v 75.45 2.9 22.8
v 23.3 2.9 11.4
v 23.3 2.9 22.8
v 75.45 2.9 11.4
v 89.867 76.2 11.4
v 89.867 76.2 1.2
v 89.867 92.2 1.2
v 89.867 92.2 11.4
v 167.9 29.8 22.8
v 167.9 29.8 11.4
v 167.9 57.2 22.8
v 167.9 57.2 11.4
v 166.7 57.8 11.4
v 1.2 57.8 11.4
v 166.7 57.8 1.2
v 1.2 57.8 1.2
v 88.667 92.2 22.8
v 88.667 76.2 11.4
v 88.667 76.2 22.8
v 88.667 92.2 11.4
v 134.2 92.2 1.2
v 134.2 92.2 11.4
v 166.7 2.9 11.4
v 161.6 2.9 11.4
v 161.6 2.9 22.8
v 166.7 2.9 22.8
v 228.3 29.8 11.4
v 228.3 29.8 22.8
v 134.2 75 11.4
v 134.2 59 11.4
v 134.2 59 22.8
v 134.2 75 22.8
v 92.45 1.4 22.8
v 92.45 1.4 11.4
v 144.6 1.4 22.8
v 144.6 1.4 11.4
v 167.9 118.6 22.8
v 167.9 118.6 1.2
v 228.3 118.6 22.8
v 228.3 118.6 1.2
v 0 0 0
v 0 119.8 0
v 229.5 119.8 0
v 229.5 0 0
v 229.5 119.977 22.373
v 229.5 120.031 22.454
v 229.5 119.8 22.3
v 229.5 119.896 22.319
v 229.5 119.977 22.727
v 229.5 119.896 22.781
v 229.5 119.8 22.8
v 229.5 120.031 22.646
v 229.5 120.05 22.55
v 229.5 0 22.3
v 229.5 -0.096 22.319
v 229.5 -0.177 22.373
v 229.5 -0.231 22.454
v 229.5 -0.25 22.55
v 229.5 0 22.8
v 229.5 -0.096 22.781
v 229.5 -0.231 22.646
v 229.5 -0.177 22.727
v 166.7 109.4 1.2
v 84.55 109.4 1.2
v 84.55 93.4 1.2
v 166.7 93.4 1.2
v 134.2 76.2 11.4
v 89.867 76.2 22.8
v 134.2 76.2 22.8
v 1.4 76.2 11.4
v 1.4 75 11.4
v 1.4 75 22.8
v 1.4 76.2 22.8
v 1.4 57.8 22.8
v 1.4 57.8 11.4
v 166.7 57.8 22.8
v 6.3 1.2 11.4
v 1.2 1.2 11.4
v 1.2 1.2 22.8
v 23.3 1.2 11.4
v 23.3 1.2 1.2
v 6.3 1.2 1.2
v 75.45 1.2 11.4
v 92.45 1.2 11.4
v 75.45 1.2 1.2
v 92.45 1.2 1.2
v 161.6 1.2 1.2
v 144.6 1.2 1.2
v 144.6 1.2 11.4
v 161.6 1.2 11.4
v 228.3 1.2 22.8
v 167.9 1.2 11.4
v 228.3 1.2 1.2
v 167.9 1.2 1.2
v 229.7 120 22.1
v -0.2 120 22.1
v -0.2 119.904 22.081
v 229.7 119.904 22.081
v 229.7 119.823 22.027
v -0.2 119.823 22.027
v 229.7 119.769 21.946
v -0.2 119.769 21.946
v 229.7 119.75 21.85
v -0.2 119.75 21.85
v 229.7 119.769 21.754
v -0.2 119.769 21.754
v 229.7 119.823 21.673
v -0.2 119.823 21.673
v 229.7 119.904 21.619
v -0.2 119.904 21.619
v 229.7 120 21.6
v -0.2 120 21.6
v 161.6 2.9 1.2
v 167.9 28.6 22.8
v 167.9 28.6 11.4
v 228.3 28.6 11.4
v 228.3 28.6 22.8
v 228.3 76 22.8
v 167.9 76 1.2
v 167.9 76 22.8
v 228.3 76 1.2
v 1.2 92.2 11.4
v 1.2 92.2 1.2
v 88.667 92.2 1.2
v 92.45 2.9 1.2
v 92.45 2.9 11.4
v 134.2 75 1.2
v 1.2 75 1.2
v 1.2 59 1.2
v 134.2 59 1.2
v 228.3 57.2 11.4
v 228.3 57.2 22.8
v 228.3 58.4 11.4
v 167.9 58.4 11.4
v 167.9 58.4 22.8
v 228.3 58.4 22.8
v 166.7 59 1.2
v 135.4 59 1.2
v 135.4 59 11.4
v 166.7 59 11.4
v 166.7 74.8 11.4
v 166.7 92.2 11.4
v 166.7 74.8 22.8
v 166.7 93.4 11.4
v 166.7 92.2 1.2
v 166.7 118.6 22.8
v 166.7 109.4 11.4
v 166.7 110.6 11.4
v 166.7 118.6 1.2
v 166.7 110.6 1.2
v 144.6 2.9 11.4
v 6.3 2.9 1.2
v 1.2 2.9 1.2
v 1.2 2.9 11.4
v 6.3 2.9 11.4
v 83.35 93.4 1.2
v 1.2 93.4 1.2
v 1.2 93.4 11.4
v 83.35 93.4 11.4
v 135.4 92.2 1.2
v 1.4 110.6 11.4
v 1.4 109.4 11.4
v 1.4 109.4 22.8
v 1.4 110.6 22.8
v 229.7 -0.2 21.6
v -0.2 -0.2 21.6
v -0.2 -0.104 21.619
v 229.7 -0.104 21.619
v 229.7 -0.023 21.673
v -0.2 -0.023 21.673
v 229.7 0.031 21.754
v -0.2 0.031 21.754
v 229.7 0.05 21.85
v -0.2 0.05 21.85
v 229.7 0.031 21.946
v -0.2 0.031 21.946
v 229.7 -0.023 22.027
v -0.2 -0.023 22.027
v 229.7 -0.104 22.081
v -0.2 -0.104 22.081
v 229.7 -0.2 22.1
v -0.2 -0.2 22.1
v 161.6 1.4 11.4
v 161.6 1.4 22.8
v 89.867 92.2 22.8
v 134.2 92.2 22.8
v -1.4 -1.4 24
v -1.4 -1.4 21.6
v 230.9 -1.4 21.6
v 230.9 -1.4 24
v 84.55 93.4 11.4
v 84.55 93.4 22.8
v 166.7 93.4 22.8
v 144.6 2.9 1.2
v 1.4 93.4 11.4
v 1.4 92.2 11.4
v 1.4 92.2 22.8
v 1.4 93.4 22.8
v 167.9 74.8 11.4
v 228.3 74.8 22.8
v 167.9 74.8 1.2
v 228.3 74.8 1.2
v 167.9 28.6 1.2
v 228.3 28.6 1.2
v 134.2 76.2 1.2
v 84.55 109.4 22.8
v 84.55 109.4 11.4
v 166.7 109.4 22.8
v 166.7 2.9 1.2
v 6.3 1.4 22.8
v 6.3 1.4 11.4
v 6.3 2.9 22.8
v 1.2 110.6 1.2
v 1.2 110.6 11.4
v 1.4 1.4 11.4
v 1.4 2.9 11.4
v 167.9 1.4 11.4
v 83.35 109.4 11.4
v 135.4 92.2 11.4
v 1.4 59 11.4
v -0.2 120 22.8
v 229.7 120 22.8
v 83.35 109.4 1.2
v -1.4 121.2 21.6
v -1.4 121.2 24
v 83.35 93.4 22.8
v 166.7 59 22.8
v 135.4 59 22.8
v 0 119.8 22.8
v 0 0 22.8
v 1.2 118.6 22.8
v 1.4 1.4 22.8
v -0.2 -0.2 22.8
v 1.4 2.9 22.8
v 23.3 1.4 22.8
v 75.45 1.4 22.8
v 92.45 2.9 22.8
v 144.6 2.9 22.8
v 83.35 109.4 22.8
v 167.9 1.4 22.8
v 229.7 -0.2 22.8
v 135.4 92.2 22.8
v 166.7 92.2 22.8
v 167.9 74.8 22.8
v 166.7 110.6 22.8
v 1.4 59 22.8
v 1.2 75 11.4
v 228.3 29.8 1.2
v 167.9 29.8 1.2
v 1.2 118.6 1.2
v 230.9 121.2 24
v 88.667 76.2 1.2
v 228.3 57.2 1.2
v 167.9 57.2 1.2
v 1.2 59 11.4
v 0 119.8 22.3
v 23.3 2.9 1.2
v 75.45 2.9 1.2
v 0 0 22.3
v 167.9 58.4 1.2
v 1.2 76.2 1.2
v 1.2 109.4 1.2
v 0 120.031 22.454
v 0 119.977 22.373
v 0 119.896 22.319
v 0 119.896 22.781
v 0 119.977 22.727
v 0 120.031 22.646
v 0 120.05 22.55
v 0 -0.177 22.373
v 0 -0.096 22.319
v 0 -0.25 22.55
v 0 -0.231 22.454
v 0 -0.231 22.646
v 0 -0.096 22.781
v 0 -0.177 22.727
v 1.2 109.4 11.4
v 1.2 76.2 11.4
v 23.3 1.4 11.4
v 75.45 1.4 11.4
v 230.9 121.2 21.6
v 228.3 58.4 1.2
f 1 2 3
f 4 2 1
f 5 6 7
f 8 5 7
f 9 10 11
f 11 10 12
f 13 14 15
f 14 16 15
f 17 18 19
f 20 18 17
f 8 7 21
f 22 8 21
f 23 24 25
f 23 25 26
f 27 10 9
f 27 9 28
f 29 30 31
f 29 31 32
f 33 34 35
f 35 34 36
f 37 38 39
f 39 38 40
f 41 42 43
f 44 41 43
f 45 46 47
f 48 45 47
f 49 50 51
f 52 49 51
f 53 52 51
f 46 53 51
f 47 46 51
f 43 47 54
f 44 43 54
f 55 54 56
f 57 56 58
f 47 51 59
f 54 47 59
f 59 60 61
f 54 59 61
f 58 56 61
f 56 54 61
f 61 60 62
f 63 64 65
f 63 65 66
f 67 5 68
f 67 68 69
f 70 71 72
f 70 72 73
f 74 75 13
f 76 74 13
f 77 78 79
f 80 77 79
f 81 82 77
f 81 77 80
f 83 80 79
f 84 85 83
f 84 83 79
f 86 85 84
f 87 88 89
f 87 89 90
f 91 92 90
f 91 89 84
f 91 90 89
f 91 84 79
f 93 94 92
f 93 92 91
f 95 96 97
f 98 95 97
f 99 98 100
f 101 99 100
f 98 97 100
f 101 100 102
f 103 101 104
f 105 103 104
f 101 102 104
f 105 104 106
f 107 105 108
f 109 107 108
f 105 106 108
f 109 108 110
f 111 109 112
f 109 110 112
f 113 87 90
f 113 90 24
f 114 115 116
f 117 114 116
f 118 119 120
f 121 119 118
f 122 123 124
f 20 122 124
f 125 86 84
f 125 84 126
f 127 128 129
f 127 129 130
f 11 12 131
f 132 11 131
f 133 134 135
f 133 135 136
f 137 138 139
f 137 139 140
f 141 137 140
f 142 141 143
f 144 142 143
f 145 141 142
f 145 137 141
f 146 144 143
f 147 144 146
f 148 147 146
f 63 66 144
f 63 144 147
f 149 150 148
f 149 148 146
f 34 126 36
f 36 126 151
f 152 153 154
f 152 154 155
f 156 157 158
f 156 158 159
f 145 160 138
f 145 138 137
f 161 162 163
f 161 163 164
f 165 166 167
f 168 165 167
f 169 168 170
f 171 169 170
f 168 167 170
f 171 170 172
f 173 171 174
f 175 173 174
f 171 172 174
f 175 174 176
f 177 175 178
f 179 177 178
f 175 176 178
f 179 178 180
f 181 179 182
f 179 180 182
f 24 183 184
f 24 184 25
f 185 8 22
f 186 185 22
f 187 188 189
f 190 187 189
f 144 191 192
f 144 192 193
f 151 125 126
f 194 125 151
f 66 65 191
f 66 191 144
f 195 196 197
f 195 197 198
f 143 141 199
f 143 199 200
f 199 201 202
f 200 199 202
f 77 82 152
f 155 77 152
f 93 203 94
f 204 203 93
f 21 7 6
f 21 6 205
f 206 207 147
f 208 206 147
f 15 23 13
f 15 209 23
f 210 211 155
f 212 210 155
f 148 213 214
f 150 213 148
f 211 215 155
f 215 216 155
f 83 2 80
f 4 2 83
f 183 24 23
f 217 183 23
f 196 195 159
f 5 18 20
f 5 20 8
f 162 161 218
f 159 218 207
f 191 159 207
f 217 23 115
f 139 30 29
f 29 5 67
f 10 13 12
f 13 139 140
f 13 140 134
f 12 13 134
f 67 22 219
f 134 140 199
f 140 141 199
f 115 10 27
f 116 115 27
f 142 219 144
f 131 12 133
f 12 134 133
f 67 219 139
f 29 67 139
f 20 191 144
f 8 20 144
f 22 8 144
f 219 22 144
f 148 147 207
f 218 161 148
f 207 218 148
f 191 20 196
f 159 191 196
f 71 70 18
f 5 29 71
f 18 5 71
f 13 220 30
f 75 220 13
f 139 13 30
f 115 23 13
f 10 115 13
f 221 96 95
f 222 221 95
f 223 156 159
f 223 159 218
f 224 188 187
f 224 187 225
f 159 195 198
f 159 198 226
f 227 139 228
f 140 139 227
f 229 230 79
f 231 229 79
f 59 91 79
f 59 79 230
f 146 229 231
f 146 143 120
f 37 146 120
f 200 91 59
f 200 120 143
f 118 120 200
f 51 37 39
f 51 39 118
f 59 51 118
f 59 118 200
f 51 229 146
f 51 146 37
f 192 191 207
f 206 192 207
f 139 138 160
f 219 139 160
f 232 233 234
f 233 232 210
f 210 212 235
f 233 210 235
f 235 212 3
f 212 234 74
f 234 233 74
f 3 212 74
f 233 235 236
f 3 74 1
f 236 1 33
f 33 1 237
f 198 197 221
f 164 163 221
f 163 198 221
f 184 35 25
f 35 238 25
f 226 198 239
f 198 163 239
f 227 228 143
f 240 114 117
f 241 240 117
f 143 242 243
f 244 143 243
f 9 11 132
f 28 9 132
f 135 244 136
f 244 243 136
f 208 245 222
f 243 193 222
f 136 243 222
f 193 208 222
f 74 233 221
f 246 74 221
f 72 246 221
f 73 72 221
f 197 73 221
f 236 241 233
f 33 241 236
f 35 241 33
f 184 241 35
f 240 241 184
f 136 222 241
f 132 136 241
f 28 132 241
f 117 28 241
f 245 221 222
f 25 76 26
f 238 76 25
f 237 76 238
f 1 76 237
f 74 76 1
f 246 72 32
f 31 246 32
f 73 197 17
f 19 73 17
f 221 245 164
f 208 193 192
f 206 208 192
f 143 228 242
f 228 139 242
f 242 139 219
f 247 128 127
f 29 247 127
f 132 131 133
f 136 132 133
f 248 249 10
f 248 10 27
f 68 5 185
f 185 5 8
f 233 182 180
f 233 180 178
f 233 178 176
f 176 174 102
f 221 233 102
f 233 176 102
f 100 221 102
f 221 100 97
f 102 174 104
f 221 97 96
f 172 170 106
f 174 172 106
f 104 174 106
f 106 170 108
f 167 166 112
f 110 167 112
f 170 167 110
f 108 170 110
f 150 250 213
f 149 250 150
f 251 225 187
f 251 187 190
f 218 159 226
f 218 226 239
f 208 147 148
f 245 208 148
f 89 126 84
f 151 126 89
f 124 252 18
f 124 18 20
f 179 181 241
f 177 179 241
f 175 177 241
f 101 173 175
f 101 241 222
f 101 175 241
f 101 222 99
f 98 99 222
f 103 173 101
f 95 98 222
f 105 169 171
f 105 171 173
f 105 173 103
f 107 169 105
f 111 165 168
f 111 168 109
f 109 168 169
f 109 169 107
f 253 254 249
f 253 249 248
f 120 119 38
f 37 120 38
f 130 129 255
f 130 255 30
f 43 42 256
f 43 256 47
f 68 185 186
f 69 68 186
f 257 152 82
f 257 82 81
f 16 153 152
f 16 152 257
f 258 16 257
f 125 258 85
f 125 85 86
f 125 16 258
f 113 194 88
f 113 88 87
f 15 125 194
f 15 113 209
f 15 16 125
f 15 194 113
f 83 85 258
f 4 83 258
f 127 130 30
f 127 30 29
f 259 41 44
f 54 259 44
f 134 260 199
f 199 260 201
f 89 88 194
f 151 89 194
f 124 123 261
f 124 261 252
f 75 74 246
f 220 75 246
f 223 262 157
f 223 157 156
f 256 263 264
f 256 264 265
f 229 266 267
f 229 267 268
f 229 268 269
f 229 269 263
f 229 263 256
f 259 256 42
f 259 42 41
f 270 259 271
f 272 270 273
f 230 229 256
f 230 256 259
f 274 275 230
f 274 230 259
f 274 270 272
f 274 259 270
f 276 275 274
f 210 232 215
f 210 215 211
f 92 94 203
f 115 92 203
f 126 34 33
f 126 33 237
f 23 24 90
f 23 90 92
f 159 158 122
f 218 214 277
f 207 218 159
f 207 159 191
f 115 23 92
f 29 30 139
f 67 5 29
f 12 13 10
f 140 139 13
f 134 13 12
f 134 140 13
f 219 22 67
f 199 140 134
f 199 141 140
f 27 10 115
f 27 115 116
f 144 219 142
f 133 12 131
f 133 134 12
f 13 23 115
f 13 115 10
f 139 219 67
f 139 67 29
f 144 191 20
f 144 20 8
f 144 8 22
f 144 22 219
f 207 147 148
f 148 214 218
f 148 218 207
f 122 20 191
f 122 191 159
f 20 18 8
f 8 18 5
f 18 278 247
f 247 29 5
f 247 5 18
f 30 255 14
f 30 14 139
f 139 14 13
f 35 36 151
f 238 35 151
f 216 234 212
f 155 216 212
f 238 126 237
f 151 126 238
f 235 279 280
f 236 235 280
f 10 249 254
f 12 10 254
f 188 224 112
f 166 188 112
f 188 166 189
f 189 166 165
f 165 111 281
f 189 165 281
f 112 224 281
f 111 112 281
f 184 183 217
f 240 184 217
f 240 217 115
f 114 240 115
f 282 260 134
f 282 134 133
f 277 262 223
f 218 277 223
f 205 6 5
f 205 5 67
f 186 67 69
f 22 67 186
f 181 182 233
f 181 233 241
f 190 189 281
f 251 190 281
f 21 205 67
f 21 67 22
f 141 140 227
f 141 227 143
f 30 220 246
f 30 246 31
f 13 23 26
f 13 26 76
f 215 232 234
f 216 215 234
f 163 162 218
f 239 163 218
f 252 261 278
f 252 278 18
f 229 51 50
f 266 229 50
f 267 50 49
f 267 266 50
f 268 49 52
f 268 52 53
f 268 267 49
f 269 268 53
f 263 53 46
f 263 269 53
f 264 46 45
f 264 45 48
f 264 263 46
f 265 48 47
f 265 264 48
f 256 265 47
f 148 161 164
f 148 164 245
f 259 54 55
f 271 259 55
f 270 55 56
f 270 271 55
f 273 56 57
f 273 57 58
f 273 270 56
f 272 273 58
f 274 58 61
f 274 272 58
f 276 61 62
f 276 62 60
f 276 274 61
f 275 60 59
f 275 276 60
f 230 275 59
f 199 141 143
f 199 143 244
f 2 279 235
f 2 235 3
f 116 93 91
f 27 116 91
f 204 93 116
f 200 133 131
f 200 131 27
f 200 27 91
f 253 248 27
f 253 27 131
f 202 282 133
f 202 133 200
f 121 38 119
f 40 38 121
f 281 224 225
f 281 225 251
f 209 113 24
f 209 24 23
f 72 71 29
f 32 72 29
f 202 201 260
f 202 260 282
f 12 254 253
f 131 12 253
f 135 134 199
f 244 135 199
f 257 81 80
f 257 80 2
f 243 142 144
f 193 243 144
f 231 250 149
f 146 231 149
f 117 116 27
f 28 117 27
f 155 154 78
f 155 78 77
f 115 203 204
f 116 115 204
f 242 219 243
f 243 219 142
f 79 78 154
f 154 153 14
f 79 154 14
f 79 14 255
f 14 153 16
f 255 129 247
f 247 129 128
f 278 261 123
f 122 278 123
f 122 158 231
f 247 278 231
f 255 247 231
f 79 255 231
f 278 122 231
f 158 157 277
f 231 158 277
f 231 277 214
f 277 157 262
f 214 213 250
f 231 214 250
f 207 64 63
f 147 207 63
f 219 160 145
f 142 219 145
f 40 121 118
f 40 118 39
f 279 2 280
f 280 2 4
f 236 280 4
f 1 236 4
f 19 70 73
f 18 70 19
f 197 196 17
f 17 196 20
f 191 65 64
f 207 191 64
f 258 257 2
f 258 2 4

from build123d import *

# Parameters (mm, degrees)
EXTRUDE_DEPTH    = 229.5
CUBE005_W        = 165.5
CUBE005_H        = 56.6
CUBE005_DEPTH    = 22.8
CUBE007_W        = 87.4667
CUBE007_H        = 16
CUBE007_DEPTH    = 22.8
CUBE008_W        = 31.3
CUBE008_H        = 33.2
CUBE008_DEPTH    = 22.8
CUBE009_W        = 44.3333
CUBE009_H        = 16
CUBE009_DEPTH    = 22.8
CUBE010_W        = 82.15
CUBE010_H        = 16
CUBE010_DEPTH    = 22.8
CUBE011_W        = 82.15
CUBE011_H        = 16
CUBE011_DEPTH    = 22.8
CUBE012_W        = 165.5
CUBE012_H        = 8
CUBE012_DEPTH    = 22.8
CUBE006_W        = 133
CUBE006_H        = 16
CUBE006_DEPTH    = 22.8
CUBE013_W        = 165.5
CUBE013_H        = 57.8
CUBE013_DEPTH    = 22.8
CUBE015_W        = 60.4
CUBE015_H        = 27.4
CUBE015_DEPTH    = 22.8
CUBE016_W        = 60.4
CUBE016_H        = 16.4
CUBE016_DEPTH    = 22.8
CUBE014_W        = 60.4
CUBE014_H        = 27.4
CUBE014_DEPTH    = 22.8
CUBE017_W        = 61.6
CUBE017_H        = 73.6
CUBE017_DEPTH    = 22.8
CUBE018_W        = 60.4
CUBE018_H        = 42.6
CUBE018_DEPTH    = 22.8
CUBE002_W        = 17
CUBE002_H        = 1.7
CUBE002_DEPTH    = 22.8
CUBE003_W        = 17
CUBE003_H        = 1.7
CUBE003_DEPTH    = 22.8
CUBE004_W        = 17
CUBE004_H        = 1.7
CUBE004_DEPTH    = 22.8
CUBE001_W        = 165.5
CUBE001_H        = 54.9
CUBE001_DEPTH    = 22.8
CUBE_W           = 229.5
CUBE_H           = 119.8
CUBE_DEPTH       = 22.8
EXTRUDE001_DEPTH = 229.9
CUBE020_W        = 232.3
CUBE020_H        = 1.2
CUBE020_DEPTH    = 1.2
CUBE021_W        = 1.2
CUBE021_H        = 122.6
CUBE021_DEPTH    = 1.2
CUBE022_W        = 232.3
CUBE022_H        = 1.2
CUBE022_DEPTH    = 1.2
CUBE023_W        = 1.2
CUBE023_H        = 122.6
CUBE023_DEPTH    = 1.2
CUBE033_W        = 87.4667
CUBE033_H        = 16
CUBE033_DEPTH    = 22.8
CUBE034_W        = 31.3
CUBE034_H        = 33.2
CUBE034_DEPTH    = 22.8
CUBE035_W        = 44.3333
CUBE035_H        = 16
CUBE035_DEPTH    = 22.8
CUBE036_W        = 82.15
CUBE036_H        = 16
CUBE036_DEPTH    = 22.8
CUBE037_W        = 82.15
CUBE037_H        = 16
CUBE037_DEPTH    = 22.8
CUBE038_W        = 165.5
CUBE038_H        = 8
CUBE038_DEPTH    = 22.8
CUBE032_W        = 133
CUBE032_H        = 16
CUBE032_DEPTH    = 22.8
CUBE040_W        = 60.4
CUBE040_H        = 27.4
CUBE040_DEPTH    = 22.8
CUBE041_W        = 60.4
CUBE041_H        = 16.4
CUBE041_DEPTH    = 22.8
CUBE039_W        = 60.4
CUBE039_H        = 27.4
CUBE039_DEPTH    = 22.8
CUBE042_W        = 60.4
CUBE042_H        = 42.6
CUBE042_DEPTH    = 22.8
CUBE029_W        = 17
CUBE029_H        = 1.7
CUBE029_DEPTH    = 22.8
CUBE030_W        = 17
CUBE030_H        = 1.7
CUBE030_DEPTH    = 22.8
CUBE031_W        = 17
CUBE031_H        = 1.7
CUBE031_DEPTH    = 22.8
CUBE028_W        = 165.5
CUBE028_H        = 54.9
CUBE028_DEPTH    = 22.8
CUBE027_W        = 229.5
CUBE027_H        = 119.8
CUBE027_DEPTH    = 22.8
CUBE025_W        = 165.3
CUBE025_H        = 57.8
CUBE025_DEPTH    = 22.8
CUBE026_W        = 61.6
CUBE026_H        = 73.4
CUBE026_DEPTH    = 22.8
CUBE024_W        = 165.3
CUBE024_H        = 56.4
CUBE024_DEPTH    = 22.8
CUBE019_W        = 232.3
CUBE019_H        = 122.6
CUBE019_DEPTH    = 1.2


with BuildPart() as extrude_body:
    # Sketch (on Face1 of difference) → Extrude (new body)
    with BuildSketch(Plane(origin=(0, 0, 0), x_dir=(0, -1, 0), z_dir=(-1, 0, 0))):
        with BuildLine():
            ThreePointArc((0, 22.3), (0.25, 22.55), (0, 22.8))
            Line((0, 22.8), (0, 22.3))
        make_face()
        with BuildLine():
            ThreePointArc((-119.8, 22.8), (-120.05, 22.55), (-119.8, 22.3))
            Line((-119.8, 22.3), (-119.8, 22.8))
        make_face()
    extrude(amount=-EXTRUDE_DEPTH)


with BuildPart() as cube005:
    # cube005 → cube005 (new body)
    with BuildSketch(Plane(origin=(1.2, 1.2, 11.4), x_dir=(1, 0, 0), z_dir=(0, 0, 1))):
        with Locations((82.75, 28.3)):
            Rectangle(CUBE005_W, CUBE005_H)
    extrude(amount=CUBE005_DEPTH)


with BuildPart() as cube007:
    # cube007 → cube007 (new body)
    with BuildSketch(Plane(origin=(0, 17.2, 0), x_dir=(1, 0, 0), z_dir=(0, 0, 1))):
        with Locations((43.73335, 8)):
            Rectangle(CUBE007_W, CUBE007_H)
    extrude(amount=CUBE007_DEPTH)


with BuildPart() as cube008:
    # cube008 → cube008 (new body)
    with BuildSketch(Plane(origin=(134.2, 0, 0), x_dir=(1, 0, 0), z_dir=(0, 0, 1))):
        with Locations((15.65, 16.6)):
            Rectangle(CUBE008_W, CUBE008_H)
    extrude(amount=CUBE008_DEPTH)


with BuildPart() as cube009:
    # cube009 → cube009 (new body)
    with BuildSketch(Plane(origin=(88.6667, 17.2, 0), x_dir=(1, 0, 0), z_dir=(0, 0, 1))):
        with Locations((22.16665, 8)):
            Rectangle(CUBE009_W, CUBE009_H)
    extrude(amount=CUBE009_DEPTH)


with BuildPart() as cube010:
    # cube010 → cube010 (new body)
    with BuildSketch(Plane(origin=(0, 34.4, 0), x_dir=(1, 0, 0), z_dir=(0, 0, 1))):
        with Locations((41.075, 8)):
            Rectangle(CUBE010_W, CUBE010_H)
    extrude(amount=CUBE010_DEPTH)


with BuildPart() as cube011:
    # cube011 → cube011 (new body)
    with BuildSketch(Plane(origin=(83.35, 34.4, 0), x_dir=(1, 0, 0), z_dir=(0, 0, 1))):
        with Locations((41.075, 8)):
            Rectangle(CUBE011_W, CUBE011_H)
    extrude(amount=CUBE011_DEPTH)


with BuildPart() as cube012:
    # cube012 → cube012 (new body)
    with BuildSketch(Plane(origin=(0, 51.6, 0), x_dir=(1, 0, 0), z_dir=(0, 0, 1))):
        with Locations((82.75, 4)):
            Rectangle(CUBE012_W, CUBE012_H)
    extrude(amount=CUBE012_DEPTH)


with BuildPart() as matrix_union001:
    # cube006 → cube006 (new body)
    with BuildSketch(Plane.XY):
        with Locations((66.5, 8)):
            Rectangle(CUBE006_W, CUBE006_H)
    extrude(amount=CUBE006_DEPTH)

    # Matrix_Union001: union cube007, cube008, cube009, cube010, cube011, cube012
    add(cube007.part)
    add(cube008.part)
    add(cube009.part)
    add(cube010.part)
    add(cube011.part)
    add(cube012.part)


with BuildPart() as matrix_union001_1:
    # Matrix_Union001 placement: moved
    add(matrix_union001.part.moved(Location((1.2, 59, 1.2))))


with BuildPart() as cube013:
    # cube013 → cube013 (new body)
    with BuildSketch(Plane(origin=(1.2, 57.8, 11.4), x_dir=(1, 0, 0), z_dir=(0, 0, 1))):
        with Locations((82.75, 28.9)):
            Rectangle(CUBE013_W, CUBE013_H)
    extrude(amount=CUBE013_DEPTH)


with BuildPart() as cube015:
    # cube015 → cube015 (new body)
    with BuildSketch(Plane(origin=(0, 28.6, 0), x_dir=(1, 0, 0), z_dir=(0, 0, 1))):
        with Locations((30.2, 13.7)):
            Rectangle(CUBE015_W, CUBE015_H)
    extrude(amount=CUBE015_DEPTH)


with BuildPart() as cube016:
    # cube016 → cube016 (new body)
    with BuildSketch(Plane(origin=(0, 57.2, 0), x_dir=(1, 0, 0), z_dir=(0, 0, 1))):
        with Locations((30.2, 8.2)):
            Rectangle(CUBE016_W, CUBE016_H)
    extrude(amount=CUBE016_DEPTH)


with BuildPart() as matrix_union002:
    # cube014 → cube014 (new body)
    with BuildSketch(Plane.XY):
        with Locations((30.2, 13.7)):
            Rectangle(CUBE014_W, CUBE014_H)
    extrude(amount=CUBE014_DEPTH)

    # Matrix_Union002: union cube015, cube016
    add(cube015.part)
    add(cube016.part)


with BuildPart() as matrix_union002_1:
    # Matrix_Union002 placement: moved
    add(matrix_union002.part.moved(Location((167.9, 1.2, 1.2))))


with BuildPart() as cube017:
    # cube017 → cube017 (new body)
    with BuildSketch(Plane(origin=(166.7, 1.2, 11.4), x_dir=(1, 0, 0), z_dir=(0, 0, 1))):
        with Locations((30.8, 36.8)):
            Rectangle(CUBE017_W, CUBE017_H)
    extrude(amount=CUBE017_DEPTH)


with BuildPart() as cube018:
    # cube018 → cube018 (new body)
    with BuildSketch(Plane(origin=(167.9, 76, 1.2), x_dir=(1, 0, 0), z_dir=(0, 0, 1))):
        with Locations((30.2, 21.3)):
            Rectangle(CUBE018_W, CUBE018_H)
    extrude(amount=CUBE018_DEPTH)


with BuildPart() as cube002:
    # cube002 → cube002 (new body)
    with BuildSketch(Plane(origin=(5.1, -1.7, 0), x_dir=(1, 0, 0), z_dir=(0, 0, 1))):
        with Locations((8.5, 0.85)):
            Rectangle(CUBE002_W, CUBE002_H)
    extrude(amount=CUBE002_DEPTH)


with BuildPart() as cube003:
    # cube003 → cube003 (new body)
    with BuildSketch(Plane(origin=(74.25, -1.7, 0), x_dir=(1, 0, 0), z_dir=(0, 0, 1))):
        with Locations((8.5, 0.85)):
            Rectangle(CUBE003_W, CUBE003_H)
    extrude(amount=CUBE003_DEPTH)


with BuildPart() as cube004:
    # cube004 → cube004 (new body)
    with BuildSketch(Plane(origin=(143.4, -1.7, 0), x_dir=(1, 0, 0), z_dir=(0, 0, 1))):
        with Locations((8.5, 0.85)):
            Rectangle(CUBE004_W, CUBE004_H)
    extrude(amount=CUBE004_DEPTH)


with BuildPart() as union:
    # cube001 → cube001 (new body)
    with BuildSketch(Plane.XY):
        with Locations((82.75, 27.45)):
            Rectangle(CUBE001_W, CUBE001_H)
    extrude(amount=CUBE001_DEPTH)

    # Matrix_Union: union cube002, cube003, cube004
    add(cube002.part)
    add(cube003.part)
    add(cube004.part)


with BuildPart() as union_1:
    # Matrix_Union placement: moved
    add(union.part.moved(Location((1.2, 2.9, 1.2))))

    # union: union cube005, Matrix_Union001, cube013, Matrix_Union002, cube017, cube018
    add(cube005.part)
    add(matrix_union001_1.part)
    add(cube013.part)
    add(matrix_union002_1.part)
    add(cube017.part)
    add(cube018.part)


with BuildPart() as fusion:
    # cube → cube (new body)
    with BuildSketch(Plane.XY):
        with Locations((114.75, 59.9)):
            Rectangle(CUBE_W, CUBE_H)
    extrude(amount=CUBE_DEPTH)

    # difference: cut union
    add(union_1.part, mode=Mode.SUBTRACT)

    # Fusion: union Extrude body
    add(extrude_body.part)


with BuildPart() as extrude001:
    # Sketch001 (on Face26 of Group) → Extrude001 (new body)
    with BuildSketch(Plane.YZ.offset(-0.2)):
        with BuildLine():
            ThreePointArc((120, 22.1), (119.75, 21.85), (120, 21.6))
            Line((120, 22.1), (120, 21.6))
        make_face()
        with BuildLine():
            ThreePointArc((-0.2, 21.6), (0.05, 21.85), (-0.2, 22.1))
            Line((-0.2, 22.1), (-0.2, 21.6))
        make_face()
    extrude(amount=EXTRUDE001_DEPTH)


with BuildPart() as cube020:
    # cube020 → cube020 (new body)
    with BuildSketch(Plane(origin=(-1.4, -1.4, 21.6), x_dir=(1, 0, 0), z_dir=(0, 0, 1))):
        with Locations((116.15, 0.6)):
            Rectangle(CUBE020_W, CUBE020_H)
    extrude(amount=CUBE020_DEPTH)


with BuildPart() as cube021:
    # cube021 → cube021 (new body)
    with BuildSketch(Plane(origin=(-1.4, -1.4, 21.6), x_dir=(1, 0, 0), z_dir=(0, 0, 1))):
        with Locations((0.6, 61.3)):
            Rectangle(CUBE021_W, CUBE021_H)
    extrude(amount=CUBE021_DEPTH)


with BuildPart() as cube022:
    # cube022 → cube022 (new body)
    with BuildSketch(Plane(origin=(-1.4, 120, 21.6), x_dir=(1, 0, 0), z_dir=(0, 0, 1))):
        with Locations((116.15, 0.6)):
            Rectangle(CUBE022_W, CUBE022_H)
    extrude(amount=CUBE022_DEPTH)


with BuildPart() as cube023:
    # cube023 → cube023 (new body)
    with BuildSketch(Plane(origin=(229.7, -1.4, 21.6), x_dir=(1, 0, 0), z_dir=(0, 0, 1))):
        with Locations((0.6, 61.3)):
            Rectangle(CUBE023_W, CUBE023_H)
    extrude(amount=CUBE023_DEPTH)


with BuildPart() as cube033:
    # cube033 → cube033 (new body)
    with BuildSketch(Plane(origin=(0, 17.2, 0), x_dir=(1, 0, 0), z_dir=(0, 0, 1))):
        with Locations((43.73335, 8)):
            Rectangle(CUBE033_W, CUBE033_H)
    extrude(amount=CUBE033_DEPTH)


with BuildPart() as cube034:
    # cube034 → cube034 (new body)
    with BuildSketch(Plane(origin=(134.2, 0, 0), x_dir=(1, 0, 0), z_dir=(0, 0, 1))):
        with Locations((15.65, 16.6)):
            Rectangle(CUBE034_W, CUBE034_H)
    extrude(amount=CUBE034_DEPTH)


with BuildPart() as cube035:
    # cube035 → cube035 (new body)
    with BuildSketch(Plane(origin=(88.6667, 17.2, 0), x_dir=(1, 0, 0), z_dir=(0, 0, 1))):
        with Locations((22.16665, 8)):
            Rectangle(CUBE035_W, CUBE035_H)
    extrude(amount=CUBE035_DEPTH)


with BuildPart() as cube036:
    # cube036 → cube036 (new body)
    with BuildSketch(Plane(origin=(0, 34.4, 0), x_dir=(1, 0, 0), z_dir=(0, 0, 1))):
        with Locations((41.075, 8)):
            Rectangle(CUBE036_W, CUBE036_H)
    extrude(amount=CUBE036_DEPTH)


with BuildPart() as cube037:
    # cube037 → cube037 (new body)
    with BuildSketch(Plane(origin=(83.35, 34.4, 0), x_dir=(1, 0, 0), z_dir=(0, 0, 1))):
        with Locations((41.075, 8)):
            Rectangle(CUBE037_W, CUBE037_H)
    extrude(amount=CUBE037_DEPTH)


with BuildPart() as cube038:
    # cube038 → cube038 (new body)
    with BuildSketch(Plane(origin=(0, 51.6, 0), x_dir=(1, 0, 0), z_dir=(0, 0, 1))):
        with Locations((82.75, 4)):
            Rectangle(CUBE038_W, CUBE038_H)
    extrude(amount=CUBE038_DEPTH)


with BuildPart() as matrix_union004:
    # cube032 → cube032 (new body)
    with BuildSketch(Plane.XY):
        with Locations((66.5, 8)):
            Rectangle(CUBE032_W, CUBE032_H)
    extrude(amount=CUBE032_DEPTH)

    # Matrix_Union004: union cube033, cube034, cube035, cube036, cube037, cube038
    add(cube033.part)
    add(cube034.part)
    add(cube035.part)
    add(cube036.part)
    add(cube037.part)
    add(cube038.part)


with BuildPart() as matrix_union004_1:
    # Matrix_Union004 placement: moved
    add(matrix_union004.part.moved(Location((1.2, 59, 1.2))))


with BuildPart() as cube040:
    # cube040 → cube040 (new body)
    with BuildSketch(Plane(origin=(0, 28.6, 0), x_dir=(1, 0, 0), z_dir=(0, 0, 1))):
        with Locations((30.2, 13.7)):
            Rectangle(CUBE040_W, CUBE040_H)
    extrude(amount=CUBE040_DEPTH)


with BuildPart() as cube041:
    # cube041 → cube041 (new body)
    with BuildSketch(Plane(origin=(0, 57.2, 0), x_dir=(1, 0, 0), z_dir=(0, 0, 1))):
        with Locations((30.2, 8.2)):
            Rectangle(CUBE041_W, CUBE041_H)
    extrude(amount=CUBE041_DEPTH)


with BuildPart() as matrix_union005:
    # cube039 → cube039 (new body)
    with BuildSketch(Plane.XY):
        with Locations((30.2, 13.7)):
            Rectangle(CUBE039_W, CUBE039_H)
    extrude(amount=CUBE039_DEPTH)

    # Matrix_Union005: union cube040, cube041
    add(cube040.part)
    add(cube041.part)


with BuildPart() as matrix_union005_1:
    # Matrix_Union005 placement: moved
    add(matrix_union005.part.moved(Location((167.9, 1.2, 1.2))))


with BuildPart() as cube042:
    # cube042 → cube042 (new body)
    with BuildSketch(Plane(origin=(167.9, 76, 1.2), x_dir=(1, 0, 0), z_dir=(0, 0, 1))):
        with Locations((30.2, 21.3)):
            Rectangle(CUBE042_W, CUBE042_H)
    extrude(amount=CUBE042_DEPTH)


with BuildPart() as cube029:
    # cube029 → cube029 (new body)
    with BuildSketch(Plane(origin=(5.1, -1.7, 0), x_dir=(1, 0, 0), z_dir=(0, 0, 1))):
        with Locations((8.5, 0.85)):
            Rectangle(CUBE029_W, CUBE029_H)
    extrude(amount=CUBE029_DEPTH)


with BuildPart() as cube030:
    # cube030 → cube030 (new body)
    with BuildSketch(Plane(origin=(74.25, -1.7, 0), x_dir=(1, 0, 0), z_dir=(0, 0, 1))):
        with Locations((8.5, 0.85)):
            Rectangle(CUBE030_W, CUBE030_H)
    extrude(amount=CUBE030_DEPTH)


with BuildPart() as cube031:
    # cube031 → cube031 (new body)
    with BuildSketch(Plane(origin=(143.4, -1.7, 0), x_dir=(1, 0, 0), z_dir=(0, 0, 1))):
        with Locations((8.5, 0.85)):
            Rectangle(CUBE031_W, CUBE031_H)
    extrude(amount=CUBE031_DEPTH)


with BuildPart() as union002:
    # cube028 → cube028 (new body)
    with BuildSketch(Plane.XY):
        with Locations((82.75, 27.45)):
            Rectangle(CUBE028_W, CUBE028_H)
    extrude(amount=CUBE028_DEPTH)

    # Matrix_Union003: union cube029, cube030, cube031
    add(cube029.part)
    add(cube030.part)
    add(cube031.part)


with BuildPart() as union002_1:
    # Matrix_Union003 placement: moved
    add(union002.part.moved(Location((1.2, 2.9, 1.2))))

    # union002: union Matrix_Union004, Matrix_Union005, cube042
    add(matrix_union004_1.part)
    add(matrix_union005_1.part)
    add(cube042.part)


with BuildPart() as difference001:
    # cube027 → cube027 (new body)
    with BuildSketch(Plane.XY):
        with Locations((114.75, 59.9)):
            Rectangle(CUBE027_W, CUBE027_H)
    extrude(amount=CUBE027_DEPTH)

    # difference001: cut union002
    add(union002_1.part, mode=Mode.SUBTRACT)


with BuildPart() as cube025:
    # cube025 → cube025 (new body)
    with BuildSketch(Plane(origin=(1.4, 57.8, 11.4), x_dir=(1, 0, 0), z_dir=(0, 0, 1))):
        with Locations((82.65, 28.9)):
            Rectangle(CUBE025_W, CUBE025_H)
    extrude(amount=CUBE025_DEPTH)


with BuildPart() as cube026:
    # cube026 → cube026 (new body)
    with BuildSketch(Plane(origin=(166.7, 1.4, 11.4), x_dir=(1, 0, 0), z_dir=(0, 0, 1))):
        with Locations((30.8, 36.7)):
            Rectangle(CUBE026_W, CUBE026_H)
    extrude(amount=CUBE026_DEPTH)


with BuildPart() as intersection:
    # cube024 → cube024 (new body)
    with BuildSketch(Plane(origin=(1.4, 1.4, 11.4), x_dir=(1, 0, 0), z_dir=(0, 0, 1))):
        with Locations((82.65, 28.2)):
            Rectangle(CUBE024_W, CUBE024_H)
    extrude(amount=CUBE024_DEPTH)

    # union001: union cube025, cube026
    add(cube025.part)
    add(cube026.part)

    # intersection: intersect difference001
    add(difference001.part, mode=Mode.INTERSECT)


with BuildPart() as fusion001:
    # cube019 → cube019 (new body)
    with BuildSketch(Plane(origin=(-1.4, -1.4, 22.8), x_dir=(1, 0, 0), z_dir=(0, 0, 1))):
        with Locations((116.15, 61.3)):
            Rectangle(CUBE019_W, CUBE019_H)
    extrude(amount=CUBE019_DEPTH)

    # Group: union cube020, cube021, cube022, cube023, intersection
    add(cube020.part)
    add(cube021.part)
    add(cube022.part)
    add(cube023.part)
    add(intersection.part)

    # Fusion001: union Extrude001
    add(extrude001.part)


solid = Compound([fusion.part, fusion001.part])
